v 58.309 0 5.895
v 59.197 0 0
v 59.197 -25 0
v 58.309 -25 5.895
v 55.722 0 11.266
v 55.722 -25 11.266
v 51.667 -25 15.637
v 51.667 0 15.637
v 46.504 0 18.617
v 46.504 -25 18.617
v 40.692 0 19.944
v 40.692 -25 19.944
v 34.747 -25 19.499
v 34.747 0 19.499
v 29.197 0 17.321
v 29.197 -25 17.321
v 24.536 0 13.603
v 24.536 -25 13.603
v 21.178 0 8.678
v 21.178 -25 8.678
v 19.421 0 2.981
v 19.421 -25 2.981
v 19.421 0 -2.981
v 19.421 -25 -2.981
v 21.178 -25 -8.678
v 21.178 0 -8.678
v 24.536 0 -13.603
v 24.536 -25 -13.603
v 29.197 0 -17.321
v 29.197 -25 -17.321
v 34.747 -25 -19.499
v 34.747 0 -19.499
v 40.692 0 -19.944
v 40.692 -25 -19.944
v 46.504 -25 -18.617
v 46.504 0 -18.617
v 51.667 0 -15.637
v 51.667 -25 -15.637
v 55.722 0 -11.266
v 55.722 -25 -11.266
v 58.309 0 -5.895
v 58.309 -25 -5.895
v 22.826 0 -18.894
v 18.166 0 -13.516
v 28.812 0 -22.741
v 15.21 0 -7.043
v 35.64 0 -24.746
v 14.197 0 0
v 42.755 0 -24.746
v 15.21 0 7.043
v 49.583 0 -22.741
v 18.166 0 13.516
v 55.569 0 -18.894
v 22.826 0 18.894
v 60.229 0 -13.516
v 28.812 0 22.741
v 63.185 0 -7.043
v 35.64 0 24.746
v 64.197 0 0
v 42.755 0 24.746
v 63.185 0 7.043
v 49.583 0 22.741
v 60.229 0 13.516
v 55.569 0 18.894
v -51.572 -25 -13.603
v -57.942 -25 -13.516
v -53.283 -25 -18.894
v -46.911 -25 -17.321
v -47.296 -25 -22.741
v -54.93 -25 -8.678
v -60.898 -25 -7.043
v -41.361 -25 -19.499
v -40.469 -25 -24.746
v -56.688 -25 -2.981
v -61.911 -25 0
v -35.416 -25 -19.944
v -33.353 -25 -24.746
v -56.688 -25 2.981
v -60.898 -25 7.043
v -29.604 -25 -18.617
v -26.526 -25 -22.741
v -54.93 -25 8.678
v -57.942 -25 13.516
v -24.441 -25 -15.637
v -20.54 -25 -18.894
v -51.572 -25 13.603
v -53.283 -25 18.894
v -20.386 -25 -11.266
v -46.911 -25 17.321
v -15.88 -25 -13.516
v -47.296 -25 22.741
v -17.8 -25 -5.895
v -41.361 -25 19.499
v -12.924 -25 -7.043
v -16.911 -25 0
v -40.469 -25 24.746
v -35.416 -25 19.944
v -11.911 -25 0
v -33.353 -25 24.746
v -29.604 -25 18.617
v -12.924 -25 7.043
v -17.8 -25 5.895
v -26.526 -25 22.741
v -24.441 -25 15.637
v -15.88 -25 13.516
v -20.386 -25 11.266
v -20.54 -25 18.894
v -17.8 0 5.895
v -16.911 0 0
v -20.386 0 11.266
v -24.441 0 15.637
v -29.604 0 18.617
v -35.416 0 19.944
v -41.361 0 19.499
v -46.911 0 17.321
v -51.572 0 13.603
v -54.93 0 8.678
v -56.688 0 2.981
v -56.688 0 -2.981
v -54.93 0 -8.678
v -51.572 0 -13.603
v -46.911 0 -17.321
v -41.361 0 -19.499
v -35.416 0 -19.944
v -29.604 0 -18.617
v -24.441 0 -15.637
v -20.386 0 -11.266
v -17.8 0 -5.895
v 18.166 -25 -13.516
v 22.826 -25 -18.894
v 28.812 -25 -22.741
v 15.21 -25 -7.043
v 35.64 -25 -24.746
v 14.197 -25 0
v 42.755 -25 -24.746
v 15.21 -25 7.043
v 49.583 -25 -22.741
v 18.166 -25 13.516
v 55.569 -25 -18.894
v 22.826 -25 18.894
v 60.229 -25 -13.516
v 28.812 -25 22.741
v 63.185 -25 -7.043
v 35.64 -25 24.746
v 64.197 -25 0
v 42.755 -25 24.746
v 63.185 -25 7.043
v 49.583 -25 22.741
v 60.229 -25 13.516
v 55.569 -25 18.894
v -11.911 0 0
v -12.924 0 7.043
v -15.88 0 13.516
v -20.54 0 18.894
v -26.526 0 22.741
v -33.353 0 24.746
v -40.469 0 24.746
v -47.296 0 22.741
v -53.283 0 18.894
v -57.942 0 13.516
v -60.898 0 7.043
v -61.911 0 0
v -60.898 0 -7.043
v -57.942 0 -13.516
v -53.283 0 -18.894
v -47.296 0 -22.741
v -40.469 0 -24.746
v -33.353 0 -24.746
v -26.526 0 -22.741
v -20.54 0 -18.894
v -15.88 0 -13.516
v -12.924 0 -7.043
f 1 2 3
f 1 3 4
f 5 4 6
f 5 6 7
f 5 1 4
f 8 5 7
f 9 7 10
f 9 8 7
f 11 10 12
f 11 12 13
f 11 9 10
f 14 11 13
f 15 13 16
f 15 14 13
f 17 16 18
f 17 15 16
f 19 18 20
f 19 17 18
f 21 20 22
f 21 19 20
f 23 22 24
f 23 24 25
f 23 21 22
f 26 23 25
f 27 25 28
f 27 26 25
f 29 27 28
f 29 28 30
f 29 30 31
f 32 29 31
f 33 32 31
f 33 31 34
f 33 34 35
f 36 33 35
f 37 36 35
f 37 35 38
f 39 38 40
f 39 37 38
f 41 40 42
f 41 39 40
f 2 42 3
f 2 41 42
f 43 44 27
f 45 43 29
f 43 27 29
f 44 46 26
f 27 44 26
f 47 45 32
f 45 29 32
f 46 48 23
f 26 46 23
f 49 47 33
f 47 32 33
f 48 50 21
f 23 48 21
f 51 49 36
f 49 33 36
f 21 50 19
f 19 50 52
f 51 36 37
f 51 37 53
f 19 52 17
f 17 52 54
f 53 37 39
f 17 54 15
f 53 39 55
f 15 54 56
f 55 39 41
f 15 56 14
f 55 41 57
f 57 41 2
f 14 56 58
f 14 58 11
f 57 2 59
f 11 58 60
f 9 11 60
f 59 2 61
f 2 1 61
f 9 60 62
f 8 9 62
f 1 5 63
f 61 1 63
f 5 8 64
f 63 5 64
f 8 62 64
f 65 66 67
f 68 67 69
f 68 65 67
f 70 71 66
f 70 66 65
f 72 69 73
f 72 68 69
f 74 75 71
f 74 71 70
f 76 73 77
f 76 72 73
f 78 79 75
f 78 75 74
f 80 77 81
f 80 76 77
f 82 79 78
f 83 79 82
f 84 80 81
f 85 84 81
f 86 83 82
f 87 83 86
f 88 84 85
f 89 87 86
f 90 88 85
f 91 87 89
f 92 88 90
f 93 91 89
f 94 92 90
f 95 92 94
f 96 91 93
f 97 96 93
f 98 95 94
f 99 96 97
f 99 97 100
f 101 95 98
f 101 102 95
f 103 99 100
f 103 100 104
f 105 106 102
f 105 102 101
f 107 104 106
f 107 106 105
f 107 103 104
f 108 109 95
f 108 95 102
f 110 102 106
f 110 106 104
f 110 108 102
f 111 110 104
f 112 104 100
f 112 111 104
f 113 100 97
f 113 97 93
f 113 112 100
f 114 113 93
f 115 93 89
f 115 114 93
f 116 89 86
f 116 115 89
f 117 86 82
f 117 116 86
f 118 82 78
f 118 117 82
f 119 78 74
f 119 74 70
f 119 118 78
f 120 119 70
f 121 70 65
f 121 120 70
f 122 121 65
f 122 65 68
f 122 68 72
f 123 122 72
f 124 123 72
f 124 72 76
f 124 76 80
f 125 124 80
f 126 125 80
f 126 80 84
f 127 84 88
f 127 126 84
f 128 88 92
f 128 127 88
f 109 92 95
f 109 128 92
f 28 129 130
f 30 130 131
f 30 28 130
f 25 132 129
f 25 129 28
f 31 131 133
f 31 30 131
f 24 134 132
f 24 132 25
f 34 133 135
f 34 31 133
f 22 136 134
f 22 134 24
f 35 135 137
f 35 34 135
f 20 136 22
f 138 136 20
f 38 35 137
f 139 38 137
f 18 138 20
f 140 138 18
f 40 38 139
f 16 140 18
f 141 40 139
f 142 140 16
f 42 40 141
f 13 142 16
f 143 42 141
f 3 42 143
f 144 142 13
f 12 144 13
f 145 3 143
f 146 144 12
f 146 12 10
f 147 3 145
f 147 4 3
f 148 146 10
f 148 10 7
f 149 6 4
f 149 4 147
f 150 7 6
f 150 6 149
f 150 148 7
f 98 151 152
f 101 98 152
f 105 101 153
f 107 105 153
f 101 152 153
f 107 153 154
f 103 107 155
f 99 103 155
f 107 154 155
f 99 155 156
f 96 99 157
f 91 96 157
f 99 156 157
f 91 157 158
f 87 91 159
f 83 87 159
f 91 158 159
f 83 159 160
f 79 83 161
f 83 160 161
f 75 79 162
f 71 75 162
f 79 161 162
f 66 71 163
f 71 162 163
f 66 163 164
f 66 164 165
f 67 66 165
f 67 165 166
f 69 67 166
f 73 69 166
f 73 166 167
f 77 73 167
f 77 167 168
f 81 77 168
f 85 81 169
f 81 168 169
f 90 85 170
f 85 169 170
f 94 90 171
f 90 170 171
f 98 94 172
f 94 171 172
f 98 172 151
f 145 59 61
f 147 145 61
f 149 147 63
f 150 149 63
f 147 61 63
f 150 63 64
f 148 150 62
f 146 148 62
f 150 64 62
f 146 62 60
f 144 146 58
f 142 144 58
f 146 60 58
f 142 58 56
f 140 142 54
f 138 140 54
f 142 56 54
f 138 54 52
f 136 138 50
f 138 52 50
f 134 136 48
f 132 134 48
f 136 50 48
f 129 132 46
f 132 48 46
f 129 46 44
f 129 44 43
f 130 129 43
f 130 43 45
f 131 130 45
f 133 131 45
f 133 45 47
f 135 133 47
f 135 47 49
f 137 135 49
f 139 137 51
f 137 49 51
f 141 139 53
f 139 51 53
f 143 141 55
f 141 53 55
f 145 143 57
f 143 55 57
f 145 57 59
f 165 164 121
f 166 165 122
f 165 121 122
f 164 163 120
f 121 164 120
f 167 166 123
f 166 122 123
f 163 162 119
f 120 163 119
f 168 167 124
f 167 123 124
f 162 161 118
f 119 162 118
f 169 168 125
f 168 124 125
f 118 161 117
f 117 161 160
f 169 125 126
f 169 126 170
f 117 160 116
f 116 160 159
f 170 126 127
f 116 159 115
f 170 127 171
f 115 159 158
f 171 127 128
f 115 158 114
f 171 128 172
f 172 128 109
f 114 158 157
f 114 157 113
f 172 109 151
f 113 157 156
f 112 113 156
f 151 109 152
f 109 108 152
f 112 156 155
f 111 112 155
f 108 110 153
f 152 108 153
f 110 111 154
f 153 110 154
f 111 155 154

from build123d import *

# Parameters (mm, degrees)
F0_R     = 25
F0_R_2   = 20
F1_DEPTH = 25


# Not quite as in the source:
# - the program builds the solid bodies; features that only make, move or delete a surface that nothing else refers to are left out


with BuildPart() as f1:
    # F0 (on Front) → F1 (new body)
    with BuildSketch(Plane.XZ):
        with Locations((-36.9110533473, 0)):
            Circle(F0_R)
        with Locations((-36.9110533473, 0)):
            Circle(F0_R_2, mode=Mode.SUBTRACT)
    extrude(amount=F1_DEPTH)


with BuildPart() as f1b:
    # F0 (on Front) → F1, piece 2 (new body)
    with BuildSketch(Plane.XZ):
        with Locations((39.197404974, 0)):
            Circle(F0_R)
        with Locations((39.197404974, 0)):
            Circle(F0_R_2, mode=Mode.SUBTRACT)
    extrude(amount=F1_DEPTH)


solid = Compound([f1.part, f1b.part])
